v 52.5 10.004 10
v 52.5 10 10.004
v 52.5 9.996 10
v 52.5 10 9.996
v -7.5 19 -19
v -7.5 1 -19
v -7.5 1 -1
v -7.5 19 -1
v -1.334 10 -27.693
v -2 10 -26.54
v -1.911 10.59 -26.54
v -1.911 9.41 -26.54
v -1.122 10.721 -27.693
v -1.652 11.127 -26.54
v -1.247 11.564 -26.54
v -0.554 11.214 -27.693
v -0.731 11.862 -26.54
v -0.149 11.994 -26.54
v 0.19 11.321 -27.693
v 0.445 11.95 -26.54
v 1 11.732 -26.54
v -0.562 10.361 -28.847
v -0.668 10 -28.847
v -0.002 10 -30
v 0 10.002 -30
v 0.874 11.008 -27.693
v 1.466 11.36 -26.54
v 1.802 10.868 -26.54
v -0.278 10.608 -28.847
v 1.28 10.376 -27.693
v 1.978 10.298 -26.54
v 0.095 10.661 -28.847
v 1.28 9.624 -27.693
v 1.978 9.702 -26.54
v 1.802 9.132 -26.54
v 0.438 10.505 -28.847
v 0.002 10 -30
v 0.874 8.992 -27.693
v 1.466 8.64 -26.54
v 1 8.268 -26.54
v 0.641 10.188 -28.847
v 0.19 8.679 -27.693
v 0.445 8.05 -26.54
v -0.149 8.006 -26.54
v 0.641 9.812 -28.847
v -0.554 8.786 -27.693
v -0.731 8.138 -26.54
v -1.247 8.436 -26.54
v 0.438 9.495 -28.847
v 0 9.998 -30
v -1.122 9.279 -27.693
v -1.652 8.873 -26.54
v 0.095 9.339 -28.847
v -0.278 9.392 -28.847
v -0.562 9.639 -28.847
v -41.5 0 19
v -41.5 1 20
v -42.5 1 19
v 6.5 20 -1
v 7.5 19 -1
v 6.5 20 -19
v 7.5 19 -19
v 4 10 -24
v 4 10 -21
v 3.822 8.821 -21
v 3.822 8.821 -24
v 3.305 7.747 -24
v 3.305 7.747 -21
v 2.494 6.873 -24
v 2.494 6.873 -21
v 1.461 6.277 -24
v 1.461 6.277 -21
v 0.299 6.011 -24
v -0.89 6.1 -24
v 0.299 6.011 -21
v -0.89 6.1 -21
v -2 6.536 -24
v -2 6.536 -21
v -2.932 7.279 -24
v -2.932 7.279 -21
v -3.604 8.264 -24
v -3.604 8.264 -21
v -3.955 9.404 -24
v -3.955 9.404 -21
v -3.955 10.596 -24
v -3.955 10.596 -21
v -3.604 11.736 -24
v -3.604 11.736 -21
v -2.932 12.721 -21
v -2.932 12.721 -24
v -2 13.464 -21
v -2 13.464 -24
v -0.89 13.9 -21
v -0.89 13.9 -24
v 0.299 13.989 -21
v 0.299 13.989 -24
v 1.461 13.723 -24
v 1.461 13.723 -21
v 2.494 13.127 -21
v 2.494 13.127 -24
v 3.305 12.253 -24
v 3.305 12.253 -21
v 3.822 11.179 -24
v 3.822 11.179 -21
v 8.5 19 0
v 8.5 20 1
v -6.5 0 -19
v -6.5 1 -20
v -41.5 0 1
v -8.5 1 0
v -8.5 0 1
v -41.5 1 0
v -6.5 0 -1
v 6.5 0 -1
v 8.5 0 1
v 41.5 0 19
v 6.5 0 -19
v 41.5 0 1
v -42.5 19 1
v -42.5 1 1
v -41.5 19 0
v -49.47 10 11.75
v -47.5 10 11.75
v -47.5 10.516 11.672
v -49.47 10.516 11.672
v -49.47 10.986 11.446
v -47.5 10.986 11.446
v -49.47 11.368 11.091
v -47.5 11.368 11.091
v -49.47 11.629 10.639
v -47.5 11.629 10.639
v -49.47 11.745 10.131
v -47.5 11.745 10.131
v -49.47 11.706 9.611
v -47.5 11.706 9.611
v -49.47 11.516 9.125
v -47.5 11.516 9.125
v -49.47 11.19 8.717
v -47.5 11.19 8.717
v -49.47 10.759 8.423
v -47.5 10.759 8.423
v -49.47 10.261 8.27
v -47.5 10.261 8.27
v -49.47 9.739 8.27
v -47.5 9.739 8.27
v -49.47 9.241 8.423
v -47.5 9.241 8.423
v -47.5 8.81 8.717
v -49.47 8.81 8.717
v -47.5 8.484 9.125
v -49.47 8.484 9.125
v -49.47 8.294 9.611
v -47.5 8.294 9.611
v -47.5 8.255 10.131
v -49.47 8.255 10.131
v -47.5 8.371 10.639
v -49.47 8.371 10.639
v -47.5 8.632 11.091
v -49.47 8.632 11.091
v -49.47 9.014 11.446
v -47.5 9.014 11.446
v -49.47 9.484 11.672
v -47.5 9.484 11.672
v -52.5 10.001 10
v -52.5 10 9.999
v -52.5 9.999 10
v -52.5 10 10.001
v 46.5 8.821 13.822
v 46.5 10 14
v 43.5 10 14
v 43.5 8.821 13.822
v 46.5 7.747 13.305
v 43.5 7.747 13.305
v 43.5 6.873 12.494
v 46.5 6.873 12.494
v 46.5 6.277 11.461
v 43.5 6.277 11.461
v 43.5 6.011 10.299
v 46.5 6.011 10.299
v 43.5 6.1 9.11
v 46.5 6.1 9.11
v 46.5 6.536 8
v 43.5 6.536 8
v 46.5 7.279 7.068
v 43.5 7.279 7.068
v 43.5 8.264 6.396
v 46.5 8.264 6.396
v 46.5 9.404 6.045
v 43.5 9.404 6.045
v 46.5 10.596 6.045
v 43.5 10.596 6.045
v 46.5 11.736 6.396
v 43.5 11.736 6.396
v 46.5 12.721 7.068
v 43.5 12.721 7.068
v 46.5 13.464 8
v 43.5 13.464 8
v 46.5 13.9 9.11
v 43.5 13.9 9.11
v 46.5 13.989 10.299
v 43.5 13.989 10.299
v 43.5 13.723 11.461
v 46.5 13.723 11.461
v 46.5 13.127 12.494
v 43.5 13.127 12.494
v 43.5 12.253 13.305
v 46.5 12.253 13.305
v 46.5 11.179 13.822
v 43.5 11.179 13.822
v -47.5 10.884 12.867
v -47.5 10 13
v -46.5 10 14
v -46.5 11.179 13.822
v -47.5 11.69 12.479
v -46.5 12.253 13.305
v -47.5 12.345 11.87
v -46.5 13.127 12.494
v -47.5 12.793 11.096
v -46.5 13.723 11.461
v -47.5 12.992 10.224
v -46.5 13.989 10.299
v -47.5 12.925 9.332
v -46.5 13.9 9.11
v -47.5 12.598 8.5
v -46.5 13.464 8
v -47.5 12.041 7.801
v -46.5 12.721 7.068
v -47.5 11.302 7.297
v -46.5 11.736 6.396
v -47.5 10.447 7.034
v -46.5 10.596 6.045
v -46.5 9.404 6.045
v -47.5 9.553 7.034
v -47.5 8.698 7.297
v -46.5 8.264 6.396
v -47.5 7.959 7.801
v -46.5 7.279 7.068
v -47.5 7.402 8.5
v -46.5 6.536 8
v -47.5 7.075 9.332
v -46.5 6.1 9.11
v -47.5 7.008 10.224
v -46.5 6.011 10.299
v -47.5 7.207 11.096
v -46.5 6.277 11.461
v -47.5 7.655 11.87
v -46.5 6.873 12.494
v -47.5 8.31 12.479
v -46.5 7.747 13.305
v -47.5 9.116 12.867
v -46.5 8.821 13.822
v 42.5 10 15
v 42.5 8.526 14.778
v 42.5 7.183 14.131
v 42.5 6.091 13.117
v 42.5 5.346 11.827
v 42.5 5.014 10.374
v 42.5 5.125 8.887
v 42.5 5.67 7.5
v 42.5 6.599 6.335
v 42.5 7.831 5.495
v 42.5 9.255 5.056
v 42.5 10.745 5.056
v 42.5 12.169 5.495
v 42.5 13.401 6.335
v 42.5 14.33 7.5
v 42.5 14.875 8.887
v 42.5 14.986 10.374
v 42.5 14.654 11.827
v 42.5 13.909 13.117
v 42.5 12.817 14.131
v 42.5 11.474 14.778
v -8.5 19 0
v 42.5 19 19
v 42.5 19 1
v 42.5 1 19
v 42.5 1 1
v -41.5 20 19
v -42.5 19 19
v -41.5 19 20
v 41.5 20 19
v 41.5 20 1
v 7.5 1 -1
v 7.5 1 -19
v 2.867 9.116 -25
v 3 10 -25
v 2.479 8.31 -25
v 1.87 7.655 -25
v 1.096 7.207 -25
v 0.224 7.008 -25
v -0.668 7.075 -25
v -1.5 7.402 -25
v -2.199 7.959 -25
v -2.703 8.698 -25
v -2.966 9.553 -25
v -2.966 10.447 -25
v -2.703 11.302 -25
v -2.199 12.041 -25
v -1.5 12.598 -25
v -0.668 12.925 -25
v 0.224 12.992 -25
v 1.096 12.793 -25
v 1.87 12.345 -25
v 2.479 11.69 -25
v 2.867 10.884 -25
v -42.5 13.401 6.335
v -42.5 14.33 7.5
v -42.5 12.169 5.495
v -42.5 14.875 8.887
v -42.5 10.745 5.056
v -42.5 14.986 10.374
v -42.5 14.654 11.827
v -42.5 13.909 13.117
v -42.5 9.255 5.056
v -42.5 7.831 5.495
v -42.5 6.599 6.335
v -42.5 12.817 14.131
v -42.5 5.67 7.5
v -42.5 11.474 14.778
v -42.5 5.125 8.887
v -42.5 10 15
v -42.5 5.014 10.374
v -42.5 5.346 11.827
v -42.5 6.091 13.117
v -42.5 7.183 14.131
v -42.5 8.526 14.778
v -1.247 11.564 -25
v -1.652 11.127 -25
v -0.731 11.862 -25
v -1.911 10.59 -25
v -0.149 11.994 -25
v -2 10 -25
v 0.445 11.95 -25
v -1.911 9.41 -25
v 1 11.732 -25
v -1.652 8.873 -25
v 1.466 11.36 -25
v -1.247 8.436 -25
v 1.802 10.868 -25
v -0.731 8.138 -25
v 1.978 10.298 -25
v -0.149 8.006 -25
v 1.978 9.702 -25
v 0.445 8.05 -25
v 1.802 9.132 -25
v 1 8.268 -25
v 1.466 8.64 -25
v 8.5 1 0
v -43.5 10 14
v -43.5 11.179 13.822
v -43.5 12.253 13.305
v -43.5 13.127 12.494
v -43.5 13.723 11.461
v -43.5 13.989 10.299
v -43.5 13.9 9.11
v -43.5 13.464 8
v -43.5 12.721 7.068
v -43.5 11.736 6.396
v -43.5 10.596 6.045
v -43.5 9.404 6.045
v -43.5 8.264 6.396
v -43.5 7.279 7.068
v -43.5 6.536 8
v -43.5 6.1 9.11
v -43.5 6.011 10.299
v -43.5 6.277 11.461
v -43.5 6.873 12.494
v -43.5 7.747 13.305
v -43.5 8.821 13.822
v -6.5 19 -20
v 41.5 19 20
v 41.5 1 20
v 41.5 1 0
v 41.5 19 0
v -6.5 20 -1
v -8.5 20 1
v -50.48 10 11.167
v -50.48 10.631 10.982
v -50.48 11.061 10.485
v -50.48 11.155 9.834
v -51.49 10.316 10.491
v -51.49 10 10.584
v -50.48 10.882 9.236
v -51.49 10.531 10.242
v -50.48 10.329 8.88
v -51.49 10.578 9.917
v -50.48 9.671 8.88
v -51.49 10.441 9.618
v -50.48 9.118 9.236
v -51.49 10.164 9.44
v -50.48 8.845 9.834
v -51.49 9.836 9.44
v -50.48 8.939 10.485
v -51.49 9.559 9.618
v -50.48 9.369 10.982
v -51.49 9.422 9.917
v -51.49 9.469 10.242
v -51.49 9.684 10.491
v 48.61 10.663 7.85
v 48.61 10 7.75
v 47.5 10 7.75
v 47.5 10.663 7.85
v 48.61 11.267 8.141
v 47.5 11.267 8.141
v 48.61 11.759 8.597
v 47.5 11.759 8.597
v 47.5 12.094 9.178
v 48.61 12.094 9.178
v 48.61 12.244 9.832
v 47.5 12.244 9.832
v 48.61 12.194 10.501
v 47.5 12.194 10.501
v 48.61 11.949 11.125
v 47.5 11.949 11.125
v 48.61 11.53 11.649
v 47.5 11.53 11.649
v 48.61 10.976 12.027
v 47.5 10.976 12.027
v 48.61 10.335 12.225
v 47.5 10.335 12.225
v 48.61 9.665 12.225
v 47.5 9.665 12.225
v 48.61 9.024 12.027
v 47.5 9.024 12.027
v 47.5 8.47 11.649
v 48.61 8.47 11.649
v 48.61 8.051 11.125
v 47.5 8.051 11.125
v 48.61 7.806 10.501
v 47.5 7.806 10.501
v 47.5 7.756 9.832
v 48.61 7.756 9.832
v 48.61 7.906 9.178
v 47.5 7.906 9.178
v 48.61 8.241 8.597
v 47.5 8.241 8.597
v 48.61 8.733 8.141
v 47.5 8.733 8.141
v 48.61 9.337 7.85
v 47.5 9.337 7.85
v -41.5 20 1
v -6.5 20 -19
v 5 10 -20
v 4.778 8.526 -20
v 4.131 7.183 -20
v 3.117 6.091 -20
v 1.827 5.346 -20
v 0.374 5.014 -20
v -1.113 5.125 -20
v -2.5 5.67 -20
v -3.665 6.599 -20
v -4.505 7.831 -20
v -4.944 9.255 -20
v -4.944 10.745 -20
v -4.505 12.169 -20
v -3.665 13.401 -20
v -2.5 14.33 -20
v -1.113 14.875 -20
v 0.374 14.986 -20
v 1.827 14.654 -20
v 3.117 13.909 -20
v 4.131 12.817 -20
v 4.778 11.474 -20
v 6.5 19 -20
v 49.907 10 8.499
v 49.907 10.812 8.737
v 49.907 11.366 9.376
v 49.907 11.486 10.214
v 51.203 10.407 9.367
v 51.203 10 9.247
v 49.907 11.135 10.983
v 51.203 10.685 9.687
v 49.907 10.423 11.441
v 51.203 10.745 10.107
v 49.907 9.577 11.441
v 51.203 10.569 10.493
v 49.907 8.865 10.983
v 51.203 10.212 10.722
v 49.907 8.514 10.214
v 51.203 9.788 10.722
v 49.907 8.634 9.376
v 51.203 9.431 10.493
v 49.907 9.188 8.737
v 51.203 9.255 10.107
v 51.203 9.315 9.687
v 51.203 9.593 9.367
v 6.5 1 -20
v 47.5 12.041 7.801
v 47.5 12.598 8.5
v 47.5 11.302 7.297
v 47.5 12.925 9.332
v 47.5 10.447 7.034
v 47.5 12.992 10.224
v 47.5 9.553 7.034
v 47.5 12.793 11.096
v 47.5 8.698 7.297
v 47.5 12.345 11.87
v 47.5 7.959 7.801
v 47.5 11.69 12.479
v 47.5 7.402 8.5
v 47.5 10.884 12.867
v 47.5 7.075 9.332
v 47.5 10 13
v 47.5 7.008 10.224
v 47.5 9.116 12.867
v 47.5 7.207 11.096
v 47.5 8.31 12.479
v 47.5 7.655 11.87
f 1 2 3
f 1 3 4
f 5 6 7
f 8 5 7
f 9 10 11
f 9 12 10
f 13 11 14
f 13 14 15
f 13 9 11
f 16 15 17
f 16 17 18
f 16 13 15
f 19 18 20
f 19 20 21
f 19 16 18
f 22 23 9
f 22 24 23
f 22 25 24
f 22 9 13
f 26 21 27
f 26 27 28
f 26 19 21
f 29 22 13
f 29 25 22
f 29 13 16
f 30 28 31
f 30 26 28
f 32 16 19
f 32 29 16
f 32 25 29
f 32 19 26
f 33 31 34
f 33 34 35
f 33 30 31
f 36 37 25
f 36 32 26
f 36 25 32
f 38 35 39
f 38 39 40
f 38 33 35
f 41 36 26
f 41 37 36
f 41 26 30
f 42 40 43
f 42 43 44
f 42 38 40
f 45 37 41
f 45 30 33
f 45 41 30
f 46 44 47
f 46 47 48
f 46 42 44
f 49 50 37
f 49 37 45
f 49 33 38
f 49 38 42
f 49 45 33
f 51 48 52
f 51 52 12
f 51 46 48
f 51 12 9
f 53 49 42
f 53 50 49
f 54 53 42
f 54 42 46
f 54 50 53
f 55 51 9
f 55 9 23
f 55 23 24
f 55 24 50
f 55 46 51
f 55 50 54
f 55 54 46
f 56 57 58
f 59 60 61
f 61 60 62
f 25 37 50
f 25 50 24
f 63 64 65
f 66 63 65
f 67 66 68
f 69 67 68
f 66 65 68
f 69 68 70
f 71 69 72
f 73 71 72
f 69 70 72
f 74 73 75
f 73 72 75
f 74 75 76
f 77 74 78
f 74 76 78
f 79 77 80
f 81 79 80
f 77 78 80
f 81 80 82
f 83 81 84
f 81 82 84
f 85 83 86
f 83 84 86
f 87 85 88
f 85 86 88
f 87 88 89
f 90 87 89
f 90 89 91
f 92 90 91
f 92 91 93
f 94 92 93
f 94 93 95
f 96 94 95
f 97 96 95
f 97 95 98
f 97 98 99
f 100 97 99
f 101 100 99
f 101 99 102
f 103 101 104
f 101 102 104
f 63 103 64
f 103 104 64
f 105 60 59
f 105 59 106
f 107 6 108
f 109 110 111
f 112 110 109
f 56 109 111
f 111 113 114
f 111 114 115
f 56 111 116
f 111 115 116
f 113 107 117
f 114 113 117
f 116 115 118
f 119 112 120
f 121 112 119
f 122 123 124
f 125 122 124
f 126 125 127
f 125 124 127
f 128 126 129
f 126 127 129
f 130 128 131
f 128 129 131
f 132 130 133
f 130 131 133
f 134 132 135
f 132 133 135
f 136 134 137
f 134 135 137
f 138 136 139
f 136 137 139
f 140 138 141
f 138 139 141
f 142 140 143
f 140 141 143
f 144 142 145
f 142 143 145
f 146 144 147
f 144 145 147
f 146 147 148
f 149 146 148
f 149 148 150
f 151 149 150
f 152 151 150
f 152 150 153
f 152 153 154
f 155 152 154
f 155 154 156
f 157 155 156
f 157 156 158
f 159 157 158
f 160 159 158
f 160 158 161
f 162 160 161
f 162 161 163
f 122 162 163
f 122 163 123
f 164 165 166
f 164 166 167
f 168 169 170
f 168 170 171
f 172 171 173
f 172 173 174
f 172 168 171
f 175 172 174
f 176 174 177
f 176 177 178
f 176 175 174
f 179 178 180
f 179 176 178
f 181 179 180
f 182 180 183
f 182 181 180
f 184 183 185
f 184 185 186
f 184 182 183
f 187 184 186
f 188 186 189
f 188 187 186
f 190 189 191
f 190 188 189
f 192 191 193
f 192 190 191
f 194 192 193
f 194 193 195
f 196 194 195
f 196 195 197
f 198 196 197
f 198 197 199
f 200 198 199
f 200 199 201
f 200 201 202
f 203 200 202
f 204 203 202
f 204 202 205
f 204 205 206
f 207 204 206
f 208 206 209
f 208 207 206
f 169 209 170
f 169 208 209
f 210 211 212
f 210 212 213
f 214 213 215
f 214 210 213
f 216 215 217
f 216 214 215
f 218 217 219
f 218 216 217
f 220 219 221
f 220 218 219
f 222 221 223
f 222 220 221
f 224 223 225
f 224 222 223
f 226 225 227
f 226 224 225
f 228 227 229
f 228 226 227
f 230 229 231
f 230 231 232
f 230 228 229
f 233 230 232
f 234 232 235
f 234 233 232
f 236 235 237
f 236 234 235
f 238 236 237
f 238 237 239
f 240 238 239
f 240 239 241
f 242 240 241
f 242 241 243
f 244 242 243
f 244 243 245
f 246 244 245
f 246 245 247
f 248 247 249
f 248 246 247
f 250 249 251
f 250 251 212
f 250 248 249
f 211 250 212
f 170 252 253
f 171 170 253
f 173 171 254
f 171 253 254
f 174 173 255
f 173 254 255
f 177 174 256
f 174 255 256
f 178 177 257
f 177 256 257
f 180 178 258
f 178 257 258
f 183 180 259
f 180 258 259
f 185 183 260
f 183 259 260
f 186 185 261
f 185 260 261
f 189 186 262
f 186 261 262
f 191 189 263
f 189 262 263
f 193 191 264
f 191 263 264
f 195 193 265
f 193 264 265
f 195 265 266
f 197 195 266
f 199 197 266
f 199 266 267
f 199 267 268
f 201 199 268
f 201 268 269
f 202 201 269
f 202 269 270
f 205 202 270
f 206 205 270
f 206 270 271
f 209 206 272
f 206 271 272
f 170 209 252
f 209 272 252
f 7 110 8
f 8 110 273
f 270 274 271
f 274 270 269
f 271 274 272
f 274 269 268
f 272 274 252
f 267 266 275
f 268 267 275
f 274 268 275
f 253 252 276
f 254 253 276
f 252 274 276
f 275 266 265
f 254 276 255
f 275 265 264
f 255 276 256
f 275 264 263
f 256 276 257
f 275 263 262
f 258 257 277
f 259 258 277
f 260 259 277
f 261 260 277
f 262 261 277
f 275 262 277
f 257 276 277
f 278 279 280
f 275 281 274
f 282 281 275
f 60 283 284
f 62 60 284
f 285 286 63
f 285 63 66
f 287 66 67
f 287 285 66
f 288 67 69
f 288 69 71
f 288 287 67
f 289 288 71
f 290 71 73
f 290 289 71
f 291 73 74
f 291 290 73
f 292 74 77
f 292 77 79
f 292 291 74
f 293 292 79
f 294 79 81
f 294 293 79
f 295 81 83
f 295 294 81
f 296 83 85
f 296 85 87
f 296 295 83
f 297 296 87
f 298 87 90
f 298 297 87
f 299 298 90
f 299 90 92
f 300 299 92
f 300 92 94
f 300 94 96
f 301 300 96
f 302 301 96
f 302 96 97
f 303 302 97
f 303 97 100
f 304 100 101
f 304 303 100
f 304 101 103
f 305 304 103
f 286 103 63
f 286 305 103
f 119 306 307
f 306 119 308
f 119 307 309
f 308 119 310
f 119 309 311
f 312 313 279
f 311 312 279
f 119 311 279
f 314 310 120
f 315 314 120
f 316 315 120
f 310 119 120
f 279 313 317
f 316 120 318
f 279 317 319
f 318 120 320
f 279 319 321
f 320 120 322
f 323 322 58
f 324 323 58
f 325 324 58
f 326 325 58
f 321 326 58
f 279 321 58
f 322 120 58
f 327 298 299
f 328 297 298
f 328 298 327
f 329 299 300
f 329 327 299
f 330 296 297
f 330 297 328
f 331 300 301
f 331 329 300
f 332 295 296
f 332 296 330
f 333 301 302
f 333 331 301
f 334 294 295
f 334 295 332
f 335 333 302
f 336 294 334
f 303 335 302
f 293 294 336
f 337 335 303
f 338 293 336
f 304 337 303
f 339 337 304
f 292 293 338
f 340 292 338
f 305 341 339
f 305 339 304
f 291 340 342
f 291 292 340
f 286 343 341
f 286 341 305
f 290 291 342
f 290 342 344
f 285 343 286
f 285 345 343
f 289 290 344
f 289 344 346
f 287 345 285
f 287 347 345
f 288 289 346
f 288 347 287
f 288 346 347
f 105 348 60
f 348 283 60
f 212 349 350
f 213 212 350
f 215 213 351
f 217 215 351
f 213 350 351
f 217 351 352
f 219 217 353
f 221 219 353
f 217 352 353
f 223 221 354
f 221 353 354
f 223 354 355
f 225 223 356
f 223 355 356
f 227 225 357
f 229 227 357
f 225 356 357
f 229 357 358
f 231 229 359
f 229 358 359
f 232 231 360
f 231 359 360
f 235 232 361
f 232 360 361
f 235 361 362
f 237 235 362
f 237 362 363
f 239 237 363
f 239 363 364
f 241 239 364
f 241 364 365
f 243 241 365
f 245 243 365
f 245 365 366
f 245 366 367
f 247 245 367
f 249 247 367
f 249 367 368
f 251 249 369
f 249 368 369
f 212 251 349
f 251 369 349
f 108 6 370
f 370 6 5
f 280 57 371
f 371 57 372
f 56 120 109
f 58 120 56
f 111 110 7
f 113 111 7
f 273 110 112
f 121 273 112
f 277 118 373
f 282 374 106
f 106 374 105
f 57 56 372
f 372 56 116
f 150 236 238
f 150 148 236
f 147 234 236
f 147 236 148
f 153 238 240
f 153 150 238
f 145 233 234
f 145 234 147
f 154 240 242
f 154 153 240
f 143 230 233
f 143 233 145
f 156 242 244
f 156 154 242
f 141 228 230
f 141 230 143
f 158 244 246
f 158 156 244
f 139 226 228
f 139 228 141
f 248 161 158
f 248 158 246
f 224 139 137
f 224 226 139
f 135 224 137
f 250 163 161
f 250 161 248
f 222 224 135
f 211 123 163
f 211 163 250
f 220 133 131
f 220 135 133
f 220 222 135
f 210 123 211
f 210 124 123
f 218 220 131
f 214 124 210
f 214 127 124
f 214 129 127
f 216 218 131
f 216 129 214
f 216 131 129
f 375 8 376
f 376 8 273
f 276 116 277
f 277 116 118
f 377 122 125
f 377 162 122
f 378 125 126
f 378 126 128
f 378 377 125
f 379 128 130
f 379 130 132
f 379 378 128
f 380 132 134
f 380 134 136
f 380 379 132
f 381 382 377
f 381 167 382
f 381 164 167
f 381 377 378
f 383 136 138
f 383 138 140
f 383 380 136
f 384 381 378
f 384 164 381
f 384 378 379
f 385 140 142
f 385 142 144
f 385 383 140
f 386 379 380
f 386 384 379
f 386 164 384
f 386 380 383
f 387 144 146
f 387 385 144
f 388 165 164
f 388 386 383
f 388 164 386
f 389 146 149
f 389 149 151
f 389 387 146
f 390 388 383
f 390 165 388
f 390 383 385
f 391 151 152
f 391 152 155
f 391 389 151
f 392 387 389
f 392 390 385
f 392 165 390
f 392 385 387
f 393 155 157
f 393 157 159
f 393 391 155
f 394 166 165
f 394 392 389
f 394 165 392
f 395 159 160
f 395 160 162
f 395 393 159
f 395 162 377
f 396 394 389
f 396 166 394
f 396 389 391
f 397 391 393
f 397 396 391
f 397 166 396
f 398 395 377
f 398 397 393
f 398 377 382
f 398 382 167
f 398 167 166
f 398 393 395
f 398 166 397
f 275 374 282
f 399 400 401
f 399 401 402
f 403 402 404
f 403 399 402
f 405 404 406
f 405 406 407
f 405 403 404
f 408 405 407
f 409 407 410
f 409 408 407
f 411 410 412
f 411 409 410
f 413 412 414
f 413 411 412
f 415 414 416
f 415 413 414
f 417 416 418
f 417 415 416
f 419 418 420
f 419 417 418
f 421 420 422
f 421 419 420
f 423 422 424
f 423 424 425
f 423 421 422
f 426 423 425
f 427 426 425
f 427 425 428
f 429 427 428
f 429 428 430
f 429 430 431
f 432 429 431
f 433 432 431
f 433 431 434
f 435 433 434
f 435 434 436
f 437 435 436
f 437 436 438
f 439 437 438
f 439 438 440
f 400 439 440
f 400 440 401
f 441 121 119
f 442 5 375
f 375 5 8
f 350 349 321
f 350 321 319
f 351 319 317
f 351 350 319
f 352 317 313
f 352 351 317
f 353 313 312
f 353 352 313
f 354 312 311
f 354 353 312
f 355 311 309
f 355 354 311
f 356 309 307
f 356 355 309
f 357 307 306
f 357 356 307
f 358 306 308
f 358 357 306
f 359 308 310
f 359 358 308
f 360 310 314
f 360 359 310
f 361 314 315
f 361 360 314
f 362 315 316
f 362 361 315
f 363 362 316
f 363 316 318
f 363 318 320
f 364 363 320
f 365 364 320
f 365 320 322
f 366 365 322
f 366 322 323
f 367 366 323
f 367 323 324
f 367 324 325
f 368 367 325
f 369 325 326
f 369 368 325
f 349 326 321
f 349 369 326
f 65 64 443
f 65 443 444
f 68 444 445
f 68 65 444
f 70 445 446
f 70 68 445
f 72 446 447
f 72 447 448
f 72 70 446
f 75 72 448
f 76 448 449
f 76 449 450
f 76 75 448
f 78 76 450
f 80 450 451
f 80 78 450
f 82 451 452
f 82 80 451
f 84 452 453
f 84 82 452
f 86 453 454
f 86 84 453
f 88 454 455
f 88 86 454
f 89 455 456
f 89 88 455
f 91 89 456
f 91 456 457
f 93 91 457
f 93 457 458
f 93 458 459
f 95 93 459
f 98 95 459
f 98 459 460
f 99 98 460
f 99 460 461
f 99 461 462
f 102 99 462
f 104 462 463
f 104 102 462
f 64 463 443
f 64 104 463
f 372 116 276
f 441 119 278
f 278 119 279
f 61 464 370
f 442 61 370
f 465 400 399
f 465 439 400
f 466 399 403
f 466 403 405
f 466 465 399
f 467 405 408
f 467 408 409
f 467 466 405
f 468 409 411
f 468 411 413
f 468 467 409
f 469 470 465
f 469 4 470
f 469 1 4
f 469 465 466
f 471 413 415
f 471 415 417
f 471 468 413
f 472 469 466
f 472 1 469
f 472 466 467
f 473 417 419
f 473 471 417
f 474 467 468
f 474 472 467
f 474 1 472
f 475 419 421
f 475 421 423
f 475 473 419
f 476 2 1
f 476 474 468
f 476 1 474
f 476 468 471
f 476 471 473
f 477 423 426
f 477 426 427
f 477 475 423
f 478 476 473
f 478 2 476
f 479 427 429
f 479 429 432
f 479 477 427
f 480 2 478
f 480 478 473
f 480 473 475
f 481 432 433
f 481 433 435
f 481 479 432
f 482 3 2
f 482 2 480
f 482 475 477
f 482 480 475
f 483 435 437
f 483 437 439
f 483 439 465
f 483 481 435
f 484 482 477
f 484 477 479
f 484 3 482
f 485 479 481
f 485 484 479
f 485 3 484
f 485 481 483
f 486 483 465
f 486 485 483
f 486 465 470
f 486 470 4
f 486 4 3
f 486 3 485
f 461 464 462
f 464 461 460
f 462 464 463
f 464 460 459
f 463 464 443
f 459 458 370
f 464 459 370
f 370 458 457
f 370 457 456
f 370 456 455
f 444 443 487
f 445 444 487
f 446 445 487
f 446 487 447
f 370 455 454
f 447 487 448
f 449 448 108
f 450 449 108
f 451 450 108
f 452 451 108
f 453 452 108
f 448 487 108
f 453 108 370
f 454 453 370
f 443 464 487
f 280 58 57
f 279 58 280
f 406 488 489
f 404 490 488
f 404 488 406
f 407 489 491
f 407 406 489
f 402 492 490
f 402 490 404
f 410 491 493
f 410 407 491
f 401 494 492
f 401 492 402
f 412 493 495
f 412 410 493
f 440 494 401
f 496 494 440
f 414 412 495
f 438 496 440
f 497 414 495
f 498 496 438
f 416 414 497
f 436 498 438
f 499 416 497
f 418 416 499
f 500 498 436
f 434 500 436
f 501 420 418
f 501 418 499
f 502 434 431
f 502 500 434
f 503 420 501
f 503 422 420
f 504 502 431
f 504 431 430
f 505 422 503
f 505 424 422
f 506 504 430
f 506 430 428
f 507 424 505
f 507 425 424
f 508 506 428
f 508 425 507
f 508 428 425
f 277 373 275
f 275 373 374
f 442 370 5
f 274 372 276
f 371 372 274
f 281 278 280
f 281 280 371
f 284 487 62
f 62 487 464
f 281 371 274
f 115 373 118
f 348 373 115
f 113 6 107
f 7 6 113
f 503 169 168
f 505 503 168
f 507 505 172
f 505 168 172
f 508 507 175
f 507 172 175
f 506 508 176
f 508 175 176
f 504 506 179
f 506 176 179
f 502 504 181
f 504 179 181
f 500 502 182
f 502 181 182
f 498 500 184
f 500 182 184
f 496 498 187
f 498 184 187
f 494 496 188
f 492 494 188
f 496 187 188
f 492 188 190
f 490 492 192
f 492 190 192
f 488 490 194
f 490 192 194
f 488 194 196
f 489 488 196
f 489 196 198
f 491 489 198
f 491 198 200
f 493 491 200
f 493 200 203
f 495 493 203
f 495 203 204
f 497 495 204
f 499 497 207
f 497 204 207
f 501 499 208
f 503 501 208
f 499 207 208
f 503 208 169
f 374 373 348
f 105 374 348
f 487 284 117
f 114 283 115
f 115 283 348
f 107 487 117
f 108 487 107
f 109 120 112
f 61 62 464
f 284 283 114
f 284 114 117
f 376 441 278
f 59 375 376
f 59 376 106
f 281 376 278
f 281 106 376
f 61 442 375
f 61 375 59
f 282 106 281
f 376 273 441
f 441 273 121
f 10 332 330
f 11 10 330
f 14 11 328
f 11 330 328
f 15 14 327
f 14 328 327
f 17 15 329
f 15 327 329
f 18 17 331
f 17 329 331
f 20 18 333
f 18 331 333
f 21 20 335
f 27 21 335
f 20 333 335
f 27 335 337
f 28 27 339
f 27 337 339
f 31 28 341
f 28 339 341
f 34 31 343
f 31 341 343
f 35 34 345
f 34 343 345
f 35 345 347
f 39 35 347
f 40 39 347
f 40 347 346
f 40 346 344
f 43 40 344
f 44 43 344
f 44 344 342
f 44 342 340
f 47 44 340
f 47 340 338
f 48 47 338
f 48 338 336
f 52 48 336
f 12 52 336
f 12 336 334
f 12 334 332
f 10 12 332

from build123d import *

# Parameters (mm, degrees)
BOSS_EXTRUDE1_DEPTH = 20
SKETCH2_R           = 4
SKETCH2_R_2         = 2
BOSS_EXTRUDE2_DEPTH = 5
SKETCH2_4_R         = 2
BOSS_EXTRUDE3_DEPTH = 10
SKETCH3_R           = 4
SKETCH3_R_2         = 1.75
BOSS_EXTRUDE4_DEPTH = 5
SKETCH3_2_R         = 1.75
BOSS_EXTRUDE5_DEPTH = 10
BOSS_EXTRUDE6_START = 5
SKETCH4_R           = 4
SKETCH4_R_2         = 2.25
BOSS_EXTRUDE6_DEPTH = 5
BOSS_EXTRUDE7_START = 10
SKETCH4_2_R         = 2.25
BOSS_EXTRUDE7_DEPTH = 10
CHAMFER1_SIZE       = 3.03
CHAMFER1_SIZE2      = 1.749371316
CHAMFER2_SIZE       = 3.46
CHAMFER2_SIZE2      = 1.997631931
CHAMFER3_SIZE       = 3.89
CHAMFER3_SIZE2      = 2.245892547
CHAMFER4_SIZE       = 1


with BuildPart() as part:
    # Sketch1 → Boss-Extrude1 (new body)
    with BuildSketch(Plane(origin=(0, 0, 0), x_dir=(1, 0, 0), z_dir=(0, 1, 0))):
        Polygon((-42.5, 0), (-42.5, -20), (42.5, -20), (42.5, 0), (7.5, 0), (7.5, 20), (-7.5, 20), (-7.5, 0), align=None)
    extrude(amount=BOSS_EXTRUDE1_DEPTH)

    # Sketch2 → Boss-Extrude2 (add)
    with BuildSketch(Plane(origin=(0, 0, -20), x_dir=(-1, 0, 0), z_dir=(0, 0, -1))):
        with Locations((0, 10)):
            Circle(SKETCH2_R)
        with Locations((0, 10)):
            Circle(SKETCH2_R_2, mode=Mode.SUBTRACT)
    extrude(amount=BOSS_EXTRUDE2_DEPTH)

    # Sketch2<4> → Boss-Extrude3 (add)
    with BuildSketch(Plane(origin=(0, 0, -20), x_dir=(-1, 0, 0), z_dir=(0, 0, -1))):
        with Locations((0, 10)):
            Circle(SKETCH2_4_R)
    extrude(amount=BOSS_EXTRUDE3_DEPTH)

    # Sketch3 → Boss-Extrude4 (add)
    with BuildSketch(Plane.ZY.offset(42.5)):
        with Locations((10, 10)):
            Circle(SKETCH3_R)
        with Locations((10, 10)):
            Circle(SKETCH3_R_2, mode=Mode.SUBTRACT)
    extrude(amount=BOSS_EXTRUDE4_DEPTH)

    # Sketch3<2> → Boss-Extrude5 (add)
    with BuildSketch(Plane.ZY.offset(42.5)):
        with Locations((10, 10)):
            Circle(SKETCH3_2_R)
    extrude(amount=BOSS_EXTRUDE5_DEPTH)

    # Sketch4 → Boss-Extrude6 (add)
    with BuildSketch(Plane(origin=(42.5, 0, 0), x_dir=(0, 0, -1), z_dir=(1, 0, 0)).offset(BOSS_EXTRUDE6_START)):
        with Locations((-10, 10)):
            Circle(SKETCH4_R)
        with Locations((-10, 10)):
            Circle(SKETCH4_R_2, mode=Mode.SUBTRACT)
    extrude(amount=-BOSS_EXTRUDE6_DEPTH)

    # Sketch4<2> → Boss-Extrude7 (add)
    with BuildSketch(Plane(origin=(42.5, 0, 0), x_dir=(0, 0, -1), z_dir=(1, 0, 0)).offset(BOSS_EXTRUDE7_START)):
        with Locations((-10, 10)):
            Circle(SKETCH4_2_R)
    extrude(amount=-BOSS_EXTRUDE7_DEPTH)

    # Chamfer1
    chamfer1_edges = [part.edges().sort_by_distance(p)[0] for p in [
        (-52.5, 10, 8.25),
    ]]
    chamfer1_side = [part.faces().sort_by_distance(p)[0] for p in [
        (-50, 10, 8.25),
    ]]
    chamfer(chamfer1_edges, length=CHAMFER1_SIZE, length2=CHAMFER1_SIZE2, reference=chamfer1_side[0])

    # Chamfer2
    chamfer2_edges = [part.edges().sort_by_distance(p)[0] for p in [
        (2, 10, -30),
    ]]
    chamfer2_side = [part.faces().sort_by_distance(p)[0] for p in [
        (2, 10, -27.5),
    ]]
    chamfer(chamfer2_edges, length=CHAMFER2_SIZE, length2=CHAMFER2_SIZE2, reference=chamfer2_side[0])

    # Chamfer3
    chamfer3_edges = [part.edges().sort_by_distance(p)[0] for p in [
        (52.5, 10, 12.25),
    ]]
    chamfer3_side = [part.faces().sort_by_distance(p)[0] for p in [
        (50, 10, 12.25),
    ]]
    chamfer(chamfer3_edges, length=CHAMFER3_SIZE, length2=CHAMFER3_SIZE2, reference=chamfer3_side[0])

    # Chamfer4
    chamfer4_edges = [part.edges().sort_by_distance(p)[0] for p in [
        (42.5, 10, 14),
        (47.5, 10, 14),
        (4, 10, -20),
        (4, 10, -25),
        (-42.5, 10, 6),
        (-47.5, 10, 6),
        (-42.5, 10, 20),
        (42.5, 10, 20),
        (7.5, 10, -20),
        (42.5, 10, 0),
        (7.5, 10, 0),
        (42.5, 0, 10),
        (25, 0, 0),
        (7.5, 0, -10),
        (0, 0, -20),
        (0, 0, 20),
        (-42.5, 0, 10),
        (-7.5, 10, -20),
        (-7.5, 0, -10),
        (-7.5, 10, 0),
        (-25, 0, 0),
        (-42.5, 10, 0),
        (-42.5, 20, 10),
        (-25, 20, 0),
        (-7.5, 20, -10),
        (0, 20, -20),
        (7.5, 20, -10),
        (25, 20, 0),
        (42.5, 20, 10),
        (0, 20, 20),
    ]]
    chamfer(chamfer4_edges, length=CHAMFER4_SIZE)


solid = part.part
